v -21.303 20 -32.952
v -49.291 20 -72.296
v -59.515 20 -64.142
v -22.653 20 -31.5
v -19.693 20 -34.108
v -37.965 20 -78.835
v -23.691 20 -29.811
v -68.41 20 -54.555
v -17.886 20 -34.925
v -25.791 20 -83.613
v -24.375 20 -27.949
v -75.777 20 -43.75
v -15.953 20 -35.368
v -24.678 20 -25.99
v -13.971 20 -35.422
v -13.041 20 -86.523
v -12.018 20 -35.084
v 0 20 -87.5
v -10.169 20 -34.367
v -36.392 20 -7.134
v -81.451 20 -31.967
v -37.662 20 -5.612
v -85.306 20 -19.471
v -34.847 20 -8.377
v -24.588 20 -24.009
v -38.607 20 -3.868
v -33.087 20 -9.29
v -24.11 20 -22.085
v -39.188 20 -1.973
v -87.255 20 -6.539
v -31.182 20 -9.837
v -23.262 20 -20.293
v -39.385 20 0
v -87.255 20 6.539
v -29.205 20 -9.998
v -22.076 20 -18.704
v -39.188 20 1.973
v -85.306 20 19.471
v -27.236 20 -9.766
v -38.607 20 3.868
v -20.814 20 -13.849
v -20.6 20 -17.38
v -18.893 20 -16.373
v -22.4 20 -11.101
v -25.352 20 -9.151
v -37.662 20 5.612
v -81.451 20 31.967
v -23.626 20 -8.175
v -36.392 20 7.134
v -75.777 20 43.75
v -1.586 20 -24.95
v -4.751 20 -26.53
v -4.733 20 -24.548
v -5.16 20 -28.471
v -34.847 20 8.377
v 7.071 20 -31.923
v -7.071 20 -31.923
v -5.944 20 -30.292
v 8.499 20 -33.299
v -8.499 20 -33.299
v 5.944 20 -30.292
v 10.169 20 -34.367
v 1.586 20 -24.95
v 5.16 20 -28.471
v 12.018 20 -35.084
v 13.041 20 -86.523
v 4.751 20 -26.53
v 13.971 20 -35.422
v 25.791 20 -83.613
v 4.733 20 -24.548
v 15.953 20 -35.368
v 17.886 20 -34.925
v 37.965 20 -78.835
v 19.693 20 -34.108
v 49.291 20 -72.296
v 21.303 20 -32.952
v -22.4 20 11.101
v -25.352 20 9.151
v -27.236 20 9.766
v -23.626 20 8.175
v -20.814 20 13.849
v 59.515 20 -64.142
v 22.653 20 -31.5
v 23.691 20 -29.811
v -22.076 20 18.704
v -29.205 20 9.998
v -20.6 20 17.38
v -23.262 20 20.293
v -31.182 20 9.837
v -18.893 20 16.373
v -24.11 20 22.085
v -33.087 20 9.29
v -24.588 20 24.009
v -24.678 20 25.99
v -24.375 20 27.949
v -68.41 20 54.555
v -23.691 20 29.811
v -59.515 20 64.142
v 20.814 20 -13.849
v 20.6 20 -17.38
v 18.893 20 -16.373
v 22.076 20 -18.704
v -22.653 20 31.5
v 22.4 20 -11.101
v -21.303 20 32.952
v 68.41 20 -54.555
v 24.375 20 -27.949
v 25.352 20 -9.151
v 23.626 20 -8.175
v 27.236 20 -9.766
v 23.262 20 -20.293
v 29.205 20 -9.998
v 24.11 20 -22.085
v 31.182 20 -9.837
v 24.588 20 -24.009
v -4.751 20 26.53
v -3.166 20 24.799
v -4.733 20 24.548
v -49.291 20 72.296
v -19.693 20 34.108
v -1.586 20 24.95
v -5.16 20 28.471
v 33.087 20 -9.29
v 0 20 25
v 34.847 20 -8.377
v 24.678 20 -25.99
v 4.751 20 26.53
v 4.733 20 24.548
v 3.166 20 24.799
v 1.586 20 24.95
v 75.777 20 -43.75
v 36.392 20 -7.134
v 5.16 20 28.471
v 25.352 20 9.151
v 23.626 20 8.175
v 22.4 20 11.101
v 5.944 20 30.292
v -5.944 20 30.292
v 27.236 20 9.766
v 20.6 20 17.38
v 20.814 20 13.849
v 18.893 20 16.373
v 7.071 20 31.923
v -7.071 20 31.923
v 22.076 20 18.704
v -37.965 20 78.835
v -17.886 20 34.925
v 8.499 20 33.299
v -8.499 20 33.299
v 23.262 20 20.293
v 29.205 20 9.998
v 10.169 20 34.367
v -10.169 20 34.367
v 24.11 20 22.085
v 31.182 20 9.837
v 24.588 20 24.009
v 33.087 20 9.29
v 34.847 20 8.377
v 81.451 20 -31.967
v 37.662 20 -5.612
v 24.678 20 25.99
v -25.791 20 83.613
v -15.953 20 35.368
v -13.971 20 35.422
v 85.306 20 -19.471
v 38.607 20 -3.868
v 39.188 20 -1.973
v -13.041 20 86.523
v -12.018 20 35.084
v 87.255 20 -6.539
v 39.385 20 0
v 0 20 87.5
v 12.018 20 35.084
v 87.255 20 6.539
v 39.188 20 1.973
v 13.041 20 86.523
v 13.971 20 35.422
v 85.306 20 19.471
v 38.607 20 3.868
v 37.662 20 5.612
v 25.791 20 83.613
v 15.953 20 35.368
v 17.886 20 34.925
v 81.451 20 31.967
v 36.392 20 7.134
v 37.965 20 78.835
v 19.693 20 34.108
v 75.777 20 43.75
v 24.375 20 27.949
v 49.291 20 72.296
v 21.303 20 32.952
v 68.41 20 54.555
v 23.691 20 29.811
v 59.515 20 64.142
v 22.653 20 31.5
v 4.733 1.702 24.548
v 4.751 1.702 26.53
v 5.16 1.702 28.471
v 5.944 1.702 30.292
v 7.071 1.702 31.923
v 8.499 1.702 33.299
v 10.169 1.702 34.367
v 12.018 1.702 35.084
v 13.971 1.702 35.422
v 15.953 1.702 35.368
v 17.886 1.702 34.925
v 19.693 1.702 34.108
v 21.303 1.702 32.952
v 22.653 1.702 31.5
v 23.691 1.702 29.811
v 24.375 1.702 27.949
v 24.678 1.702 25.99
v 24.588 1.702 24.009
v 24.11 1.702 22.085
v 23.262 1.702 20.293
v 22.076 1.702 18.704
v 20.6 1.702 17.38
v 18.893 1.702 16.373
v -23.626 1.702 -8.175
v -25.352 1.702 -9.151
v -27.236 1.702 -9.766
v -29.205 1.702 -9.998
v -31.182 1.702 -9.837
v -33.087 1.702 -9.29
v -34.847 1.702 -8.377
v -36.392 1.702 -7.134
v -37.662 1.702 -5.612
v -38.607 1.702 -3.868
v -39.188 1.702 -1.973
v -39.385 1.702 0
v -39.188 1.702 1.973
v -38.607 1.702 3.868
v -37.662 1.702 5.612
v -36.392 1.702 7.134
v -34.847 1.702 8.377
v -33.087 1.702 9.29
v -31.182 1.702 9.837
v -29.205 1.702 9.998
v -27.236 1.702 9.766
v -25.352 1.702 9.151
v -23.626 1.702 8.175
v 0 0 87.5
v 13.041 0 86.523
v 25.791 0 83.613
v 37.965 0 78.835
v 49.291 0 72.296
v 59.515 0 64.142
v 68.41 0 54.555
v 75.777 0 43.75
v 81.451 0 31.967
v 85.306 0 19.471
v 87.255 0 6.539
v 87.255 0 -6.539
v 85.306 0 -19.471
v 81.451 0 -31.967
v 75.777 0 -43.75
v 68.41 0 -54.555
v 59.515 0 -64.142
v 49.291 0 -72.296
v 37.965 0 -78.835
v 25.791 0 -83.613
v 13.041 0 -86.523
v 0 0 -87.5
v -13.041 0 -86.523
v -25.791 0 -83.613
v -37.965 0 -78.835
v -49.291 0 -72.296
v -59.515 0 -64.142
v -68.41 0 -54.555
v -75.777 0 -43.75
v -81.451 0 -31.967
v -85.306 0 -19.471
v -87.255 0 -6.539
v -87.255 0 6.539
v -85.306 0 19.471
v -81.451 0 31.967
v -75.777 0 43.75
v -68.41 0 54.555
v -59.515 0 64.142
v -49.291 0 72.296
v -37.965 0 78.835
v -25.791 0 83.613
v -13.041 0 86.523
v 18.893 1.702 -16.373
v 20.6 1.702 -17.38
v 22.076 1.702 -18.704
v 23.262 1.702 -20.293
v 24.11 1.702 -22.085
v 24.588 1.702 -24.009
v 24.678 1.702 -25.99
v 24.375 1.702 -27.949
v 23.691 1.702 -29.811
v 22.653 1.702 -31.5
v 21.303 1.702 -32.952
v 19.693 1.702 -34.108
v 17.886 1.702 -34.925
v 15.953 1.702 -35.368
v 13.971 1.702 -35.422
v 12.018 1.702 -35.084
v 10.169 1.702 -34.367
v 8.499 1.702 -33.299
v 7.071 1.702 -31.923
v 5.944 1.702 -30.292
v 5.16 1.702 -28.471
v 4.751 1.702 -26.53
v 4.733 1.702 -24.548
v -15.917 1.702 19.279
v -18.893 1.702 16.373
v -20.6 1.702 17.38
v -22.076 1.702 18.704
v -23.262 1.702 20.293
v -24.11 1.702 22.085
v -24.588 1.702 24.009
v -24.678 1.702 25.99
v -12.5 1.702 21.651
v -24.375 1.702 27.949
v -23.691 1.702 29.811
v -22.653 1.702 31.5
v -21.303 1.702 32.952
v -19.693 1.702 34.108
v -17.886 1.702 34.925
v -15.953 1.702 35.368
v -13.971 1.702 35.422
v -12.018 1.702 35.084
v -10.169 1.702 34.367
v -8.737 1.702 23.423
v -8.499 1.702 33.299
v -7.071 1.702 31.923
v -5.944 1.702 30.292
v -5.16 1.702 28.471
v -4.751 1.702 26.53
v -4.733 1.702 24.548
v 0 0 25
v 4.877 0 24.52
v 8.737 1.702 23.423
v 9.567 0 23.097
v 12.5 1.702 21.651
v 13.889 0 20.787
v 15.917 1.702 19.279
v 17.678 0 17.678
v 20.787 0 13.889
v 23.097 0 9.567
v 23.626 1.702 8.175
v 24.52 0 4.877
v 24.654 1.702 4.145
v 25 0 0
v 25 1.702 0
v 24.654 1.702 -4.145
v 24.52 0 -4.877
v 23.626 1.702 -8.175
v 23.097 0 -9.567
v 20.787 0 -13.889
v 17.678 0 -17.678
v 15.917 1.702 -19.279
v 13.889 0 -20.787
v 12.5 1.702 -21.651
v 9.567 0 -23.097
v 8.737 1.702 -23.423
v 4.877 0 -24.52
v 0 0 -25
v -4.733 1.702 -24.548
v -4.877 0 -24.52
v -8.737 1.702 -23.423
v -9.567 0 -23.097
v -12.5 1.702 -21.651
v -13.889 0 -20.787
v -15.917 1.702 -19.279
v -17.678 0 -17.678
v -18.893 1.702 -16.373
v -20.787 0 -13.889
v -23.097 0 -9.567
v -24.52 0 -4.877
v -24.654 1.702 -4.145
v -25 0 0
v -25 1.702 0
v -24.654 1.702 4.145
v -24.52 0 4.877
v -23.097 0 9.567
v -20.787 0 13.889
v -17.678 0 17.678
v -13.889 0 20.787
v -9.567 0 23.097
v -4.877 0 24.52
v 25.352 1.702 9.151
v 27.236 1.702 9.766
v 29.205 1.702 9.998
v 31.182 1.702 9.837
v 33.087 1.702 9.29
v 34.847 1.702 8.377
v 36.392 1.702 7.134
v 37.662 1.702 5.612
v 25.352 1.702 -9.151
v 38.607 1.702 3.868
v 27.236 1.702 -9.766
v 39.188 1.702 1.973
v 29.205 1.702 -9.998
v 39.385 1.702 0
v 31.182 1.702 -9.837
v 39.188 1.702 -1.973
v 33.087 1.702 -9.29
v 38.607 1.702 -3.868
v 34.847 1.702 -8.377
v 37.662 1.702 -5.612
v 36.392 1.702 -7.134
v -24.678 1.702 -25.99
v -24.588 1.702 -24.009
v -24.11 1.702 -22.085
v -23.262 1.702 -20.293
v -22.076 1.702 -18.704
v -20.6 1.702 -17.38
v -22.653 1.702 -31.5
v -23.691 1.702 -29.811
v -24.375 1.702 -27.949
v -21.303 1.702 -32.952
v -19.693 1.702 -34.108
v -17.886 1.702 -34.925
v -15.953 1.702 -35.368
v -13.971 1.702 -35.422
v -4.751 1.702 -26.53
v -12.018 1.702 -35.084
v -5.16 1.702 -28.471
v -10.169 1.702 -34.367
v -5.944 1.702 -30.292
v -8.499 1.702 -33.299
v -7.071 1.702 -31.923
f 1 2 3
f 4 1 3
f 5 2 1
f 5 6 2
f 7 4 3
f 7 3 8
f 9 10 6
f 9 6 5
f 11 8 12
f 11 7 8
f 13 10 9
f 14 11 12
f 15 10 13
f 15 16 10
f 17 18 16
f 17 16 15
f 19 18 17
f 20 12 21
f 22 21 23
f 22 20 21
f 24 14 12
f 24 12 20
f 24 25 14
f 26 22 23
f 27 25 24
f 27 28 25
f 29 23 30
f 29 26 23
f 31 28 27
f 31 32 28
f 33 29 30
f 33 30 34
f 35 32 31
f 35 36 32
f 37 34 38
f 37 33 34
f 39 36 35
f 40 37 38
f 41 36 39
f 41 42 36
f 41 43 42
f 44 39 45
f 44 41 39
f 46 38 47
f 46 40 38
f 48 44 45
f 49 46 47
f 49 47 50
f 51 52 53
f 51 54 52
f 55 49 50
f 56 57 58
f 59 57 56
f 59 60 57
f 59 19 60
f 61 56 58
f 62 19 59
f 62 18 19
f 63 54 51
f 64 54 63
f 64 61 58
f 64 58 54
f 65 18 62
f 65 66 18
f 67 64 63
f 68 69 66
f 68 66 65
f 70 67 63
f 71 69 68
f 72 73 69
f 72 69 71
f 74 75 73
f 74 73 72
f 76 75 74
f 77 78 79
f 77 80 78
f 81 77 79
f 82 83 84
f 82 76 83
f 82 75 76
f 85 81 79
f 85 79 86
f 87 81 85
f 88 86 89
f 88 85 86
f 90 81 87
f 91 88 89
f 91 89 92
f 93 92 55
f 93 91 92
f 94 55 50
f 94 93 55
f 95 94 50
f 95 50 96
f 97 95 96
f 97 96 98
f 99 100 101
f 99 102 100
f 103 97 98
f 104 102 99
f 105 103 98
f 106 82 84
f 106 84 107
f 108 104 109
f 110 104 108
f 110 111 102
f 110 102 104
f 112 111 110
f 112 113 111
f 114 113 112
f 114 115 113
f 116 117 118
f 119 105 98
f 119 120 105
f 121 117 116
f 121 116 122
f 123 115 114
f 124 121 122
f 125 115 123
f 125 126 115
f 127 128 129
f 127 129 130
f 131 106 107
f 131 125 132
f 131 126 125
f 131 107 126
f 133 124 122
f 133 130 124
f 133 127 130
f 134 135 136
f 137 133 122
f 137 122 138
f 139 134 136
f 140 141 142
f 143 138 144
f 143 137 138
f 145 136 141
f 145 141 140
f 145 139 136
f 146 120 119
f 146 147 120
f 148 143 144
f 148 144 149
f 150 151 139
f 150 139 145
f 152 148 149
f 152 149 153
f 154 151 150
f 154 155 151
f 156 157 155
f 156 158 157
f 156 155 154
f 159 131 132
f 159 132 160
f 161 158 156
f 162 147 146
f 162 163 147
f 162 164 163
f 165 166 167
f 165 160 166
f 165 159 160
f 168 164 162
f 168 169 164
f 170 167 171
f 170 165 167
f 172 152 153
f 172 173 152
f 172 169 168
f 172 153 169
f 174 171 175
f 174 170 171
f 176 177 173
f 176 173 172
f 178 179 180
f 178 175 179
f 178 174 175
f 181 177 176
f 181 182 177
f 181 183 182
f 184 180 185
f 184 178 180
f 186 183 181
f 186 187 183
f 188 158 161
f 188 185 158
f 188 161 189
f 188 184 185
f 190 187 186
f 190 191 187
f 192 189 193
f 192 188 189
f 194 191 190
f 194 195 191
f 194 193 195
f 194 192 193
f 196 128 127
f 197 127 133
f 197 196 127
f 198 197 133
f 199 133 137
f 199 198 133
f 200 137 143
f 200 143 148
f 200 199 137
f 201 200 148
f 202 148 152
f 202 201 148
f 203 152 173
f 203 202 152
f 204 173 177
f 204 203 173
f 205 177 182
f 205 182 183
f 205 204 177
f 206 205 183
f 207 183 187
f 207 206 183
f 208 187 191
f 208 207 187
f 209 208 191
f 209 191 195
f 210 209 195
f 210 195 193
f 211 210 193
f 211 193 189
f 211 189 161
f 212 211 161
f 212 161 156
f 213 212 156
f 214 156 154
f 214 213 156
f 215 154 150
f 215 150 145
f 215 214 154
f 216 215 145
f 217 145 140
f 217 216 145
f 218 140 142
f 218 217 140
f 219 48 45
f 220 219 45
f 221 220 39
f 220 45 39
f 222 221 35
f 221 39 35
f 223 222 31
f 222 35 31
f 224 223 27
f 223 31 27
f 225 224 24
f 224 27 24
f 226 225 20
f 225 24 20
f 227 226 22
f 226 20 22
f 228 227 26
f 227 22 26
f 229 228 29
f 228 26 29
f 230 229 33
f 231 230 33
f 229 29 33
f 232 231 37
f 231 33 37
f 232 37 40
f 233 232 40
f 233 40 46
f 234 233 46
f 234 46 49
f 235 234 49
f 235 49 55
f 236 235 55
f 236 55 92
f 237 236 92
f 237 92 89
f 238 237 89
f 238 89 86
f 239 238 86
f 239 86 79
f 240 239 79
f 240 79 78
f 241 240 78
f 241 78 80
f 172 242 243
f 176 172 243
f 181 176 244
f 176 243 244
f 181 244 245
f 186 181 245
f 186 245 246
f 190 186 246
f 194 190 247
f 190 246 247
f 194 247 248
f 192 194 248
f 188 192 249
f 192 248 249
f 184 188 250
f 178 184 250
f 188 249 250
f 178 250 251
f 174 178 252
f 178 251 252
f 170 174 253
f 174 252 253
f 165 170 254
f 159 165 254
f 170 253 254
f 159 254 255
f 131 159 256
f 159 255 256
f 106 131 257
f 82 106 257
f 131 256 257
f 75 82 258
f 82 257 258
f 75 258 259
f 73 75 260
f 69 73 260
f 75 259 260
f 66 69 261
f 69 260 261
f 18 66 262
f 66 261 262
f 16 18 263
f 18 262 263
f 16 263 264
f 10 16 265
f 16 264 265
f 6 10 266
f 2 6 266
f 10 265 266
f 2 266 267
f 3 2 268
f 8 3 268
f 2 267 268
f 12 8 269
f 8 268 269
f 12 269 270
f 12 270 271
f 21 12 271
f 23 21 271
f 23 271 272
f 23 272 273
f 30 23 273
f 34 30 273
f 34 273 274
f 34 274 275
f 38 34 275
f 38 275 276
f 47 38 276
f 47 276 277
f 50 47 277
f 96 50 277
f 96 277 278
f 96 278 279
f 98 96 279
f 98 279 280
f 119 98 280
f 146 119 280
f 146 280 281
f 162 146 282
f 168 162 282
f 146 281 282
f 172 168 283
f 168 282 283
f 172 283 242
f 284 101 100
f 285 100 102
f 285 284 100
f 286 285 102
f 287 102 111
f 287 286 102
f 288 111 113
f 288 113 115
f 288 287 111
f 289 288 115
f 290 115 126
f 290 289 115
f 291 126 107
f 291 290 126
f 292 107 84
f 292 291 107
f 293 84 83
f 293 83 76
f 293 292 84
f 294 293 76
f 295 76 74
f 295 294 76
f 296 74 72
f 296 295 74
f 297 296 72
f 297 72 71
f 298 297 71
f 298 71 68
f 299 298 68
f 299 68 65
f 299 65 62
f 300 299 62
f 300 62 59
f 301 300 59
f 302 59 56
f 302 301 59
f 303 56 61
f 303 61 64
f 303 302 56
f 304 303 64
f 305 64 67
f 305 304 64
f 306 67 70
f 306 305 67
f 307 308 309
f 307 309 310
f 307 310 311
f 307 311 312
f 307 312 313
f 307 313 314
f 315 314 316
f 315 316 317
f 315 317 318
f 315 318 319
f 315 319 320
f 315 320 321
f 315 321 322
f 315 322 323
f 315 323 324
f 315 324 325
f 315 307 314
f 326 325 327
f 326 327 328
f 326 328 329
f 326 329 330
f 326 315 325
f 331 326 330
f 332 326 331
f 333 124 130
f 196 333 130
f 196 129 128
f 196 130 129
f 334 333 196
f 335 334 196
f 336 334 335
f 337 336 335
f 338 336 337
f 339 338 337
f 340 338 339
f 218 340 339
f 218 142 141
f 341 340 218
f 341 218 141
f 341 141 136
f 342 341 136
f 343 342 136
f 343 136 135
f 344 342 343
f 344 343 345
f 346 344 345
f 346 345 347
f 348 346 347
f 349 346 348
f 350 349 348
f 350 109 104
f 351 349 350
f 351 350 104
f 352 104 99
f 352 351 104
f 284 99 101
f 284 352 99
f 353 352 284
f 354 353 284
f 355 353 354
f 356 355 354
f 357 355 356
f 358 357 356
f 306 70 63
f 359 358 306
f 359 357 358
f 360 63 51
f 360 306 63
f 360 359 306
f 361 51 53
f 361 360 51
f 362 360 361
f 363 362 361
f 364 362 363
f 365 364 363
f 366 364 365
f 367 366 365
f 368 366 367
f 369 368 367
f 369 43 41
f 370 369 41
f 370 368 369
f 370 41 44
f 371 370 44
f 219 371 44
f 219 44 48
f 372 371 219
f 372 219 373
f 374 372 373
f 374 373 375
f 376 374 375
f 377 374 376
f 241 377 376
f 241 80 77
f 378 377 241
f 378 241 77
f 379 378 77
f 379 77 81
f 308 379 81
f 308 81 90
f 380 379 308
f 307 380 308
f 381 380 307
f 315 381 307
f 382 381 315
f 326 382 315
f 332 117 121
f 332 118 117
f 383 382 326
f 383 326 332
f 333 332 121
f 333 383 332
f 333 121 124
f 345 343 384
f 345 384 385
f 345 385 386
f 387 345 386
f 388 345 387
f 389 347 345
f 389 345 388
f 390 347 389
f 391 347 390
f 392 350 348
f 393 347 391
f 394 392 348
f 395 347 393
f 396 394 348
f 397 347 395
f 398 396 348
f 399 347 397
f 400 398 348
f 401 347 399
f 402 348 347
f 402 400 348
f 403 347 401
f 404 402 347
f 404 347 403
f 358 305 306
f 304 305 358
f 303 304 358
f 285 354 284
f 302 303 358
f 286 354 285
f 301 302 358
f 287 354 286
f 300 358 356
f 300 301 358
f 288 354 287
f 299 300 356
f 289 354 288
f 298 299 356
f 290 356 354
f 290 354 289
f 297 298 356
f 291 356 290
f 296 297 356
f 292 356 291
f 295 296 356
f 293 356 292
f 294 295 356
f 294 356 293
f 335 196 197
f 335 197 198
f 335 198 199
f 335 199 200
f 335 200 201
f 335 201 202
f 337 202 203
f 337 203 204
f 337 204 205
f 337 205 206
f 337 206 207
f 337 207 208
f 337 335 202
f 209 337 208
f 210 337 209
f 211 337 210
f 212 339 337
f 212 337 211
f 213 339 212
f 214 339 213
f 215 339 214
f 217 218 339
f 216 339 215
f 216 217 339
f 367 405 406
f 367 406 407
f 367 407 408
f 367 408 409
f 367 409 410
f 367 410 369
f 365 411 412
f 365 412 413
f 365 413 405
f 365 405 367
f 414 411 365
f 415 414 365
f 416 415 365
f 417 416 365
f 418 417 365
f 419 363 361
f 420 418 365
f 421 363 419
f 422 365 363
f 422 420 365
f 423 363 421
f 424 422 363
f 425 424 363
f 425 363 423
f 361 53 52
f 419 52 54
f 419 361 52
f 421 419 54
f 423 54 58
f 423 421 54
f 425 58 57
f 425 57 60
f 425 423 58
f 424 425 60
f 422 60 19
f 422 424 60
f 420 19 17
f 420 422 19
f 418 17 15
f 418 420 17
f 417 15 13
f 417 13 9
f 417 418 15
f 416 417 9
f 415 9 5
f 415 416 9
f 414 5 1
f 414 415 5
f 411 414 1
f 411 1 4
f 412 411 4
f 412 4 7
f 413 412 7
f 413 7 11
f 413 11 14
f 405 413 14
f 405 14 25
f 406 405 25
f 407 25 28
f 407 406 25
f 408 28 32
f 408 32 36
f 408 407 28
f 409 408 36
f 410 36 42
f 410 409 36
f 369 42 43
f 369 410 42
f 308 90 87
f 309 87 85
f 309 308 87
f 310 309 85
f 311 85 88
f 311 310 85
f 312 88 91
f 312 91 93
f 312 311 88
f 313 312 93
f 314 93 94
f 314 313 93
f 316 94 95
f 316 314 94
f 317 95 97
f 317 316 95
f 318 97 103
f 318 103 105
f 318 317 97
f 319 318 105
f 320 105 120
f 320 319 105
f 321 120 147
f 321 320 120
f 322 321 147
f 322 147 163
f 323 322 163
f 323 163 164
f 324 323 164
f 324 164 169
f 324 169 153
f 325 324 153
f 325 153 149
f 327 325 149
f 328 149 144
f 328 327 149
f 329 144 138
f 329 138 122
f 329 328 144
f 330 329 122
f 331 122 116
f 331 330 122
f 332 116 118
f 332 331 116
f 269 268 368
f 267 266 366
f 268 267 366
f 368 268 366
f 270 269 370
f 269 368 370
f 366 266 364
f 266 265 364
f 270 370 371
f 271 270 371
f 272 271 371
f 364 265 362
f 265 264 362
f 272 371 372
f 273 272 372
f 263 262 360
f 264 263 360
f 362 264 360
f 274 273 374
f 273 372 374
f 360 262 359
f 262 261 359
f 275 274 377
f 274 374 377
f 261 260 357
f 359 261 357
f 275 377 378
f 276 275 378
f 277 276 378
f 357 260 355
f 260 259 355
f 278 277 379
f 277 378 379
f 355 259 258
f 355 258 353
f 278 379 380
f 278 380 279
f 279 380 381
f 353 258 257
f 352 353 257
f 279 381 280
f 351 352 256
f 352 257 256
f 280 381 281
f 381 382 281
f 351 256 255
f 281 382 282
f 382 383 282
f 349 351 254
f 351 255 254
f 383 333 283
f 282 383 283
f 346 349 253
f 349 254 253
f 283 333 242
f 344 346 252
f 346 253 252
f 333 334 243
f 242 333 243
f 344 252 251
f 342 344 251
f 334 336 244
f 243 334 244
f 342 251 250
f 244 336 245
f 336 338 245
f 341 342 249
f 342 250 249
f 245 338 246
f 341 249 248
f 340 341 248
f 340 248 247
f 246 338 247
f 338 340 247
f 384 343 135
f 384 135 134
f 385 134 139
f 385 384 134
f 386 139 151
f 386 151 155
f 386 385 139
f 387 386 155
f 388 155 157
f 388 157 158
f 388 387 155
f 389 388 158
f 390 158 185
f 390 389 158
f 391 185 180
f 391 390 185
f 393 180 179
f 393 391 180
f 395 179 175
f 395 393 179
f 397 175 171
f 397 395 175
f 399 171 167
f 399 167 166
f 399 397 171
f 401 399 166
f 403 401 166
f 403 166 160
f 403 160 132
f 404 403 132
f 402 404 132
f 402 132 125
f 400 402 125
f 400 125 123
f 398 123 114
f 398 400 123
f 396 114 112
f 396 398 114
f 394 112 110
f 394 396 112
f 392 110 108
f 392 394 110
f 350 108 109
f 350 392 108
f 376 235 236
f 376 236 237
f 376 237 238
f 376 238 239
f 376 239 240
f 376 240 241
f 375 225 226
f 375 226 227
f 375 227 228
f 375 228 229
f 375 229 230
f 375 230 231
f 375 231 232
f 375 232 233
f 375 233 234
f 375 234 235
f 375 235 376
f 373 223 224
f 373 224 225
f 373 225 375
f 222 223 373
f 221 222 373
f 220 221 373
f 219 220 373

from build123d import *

# Parameters (mm, degrees)
SKETCH1_R           = 87.5
BOSS_EXTRUDE1_DEPTH = 20
SKETCH2_R           = 25
CUT_EXTRUDE1_DEPTH  = 126.349511367
SKETCH3_R           = 10
CUT_EXTRUDE2_DEPTH  = 18.298379086
CIRPATTERN1_COUNT   = 6


with BuildPart() as part:
    # Sketch1 → Boss-Extrude1 (new body)
    with BuildSketch(Plane(origin=(0, 0, 0), x_dir=(1, 0, 0), z_dir=(0, 1, 0))):
        Circle(SKETCH1_R)
    extrude(amount=BOSS_EXTRUDE1_DEPTH)

    # Sketch2 → Cut-Extrude1 (cut, through all)
    with BuildSketch(Plane(origin=(0, 0, 0), x_dir=(1, 0, 0), z_dir=(0, 1, 0))):
        Circle(SKETCH2_R)
    extrude(amount=CUT_EXTRUDE1_DEPTH, mode=Mode.SUBTRACT)

    # Sketch3 → Cut-Extrude2 (cut)
    with BuildSketch(Plane(origin=(0, 20, 0), x_dir=(1, 0, 0), z_dir=(0, 1, 0))):
        with Locations((-29.38501669, 0)):
            Circle(SKETCH3_R)
    cut_extrude2 = extrude(amount=-CUT_EXTRUDE2_DEPTH, mode=Mode.SUBTRACT)

    # CirPattern1: Cut-Extrude2 ×6 about axis
    cirpattern1_axis = Axis((0, 0, 0), (0, 1, 0))
    for i in range(1, CIRPATTERN1_COUNT):
        add(cut_extrude2.rotate(cirpattern1_axis, i * 360 / CIRPATTERN1_COUNT), mode=Mode.SUBTRACT)


solid = part.part
